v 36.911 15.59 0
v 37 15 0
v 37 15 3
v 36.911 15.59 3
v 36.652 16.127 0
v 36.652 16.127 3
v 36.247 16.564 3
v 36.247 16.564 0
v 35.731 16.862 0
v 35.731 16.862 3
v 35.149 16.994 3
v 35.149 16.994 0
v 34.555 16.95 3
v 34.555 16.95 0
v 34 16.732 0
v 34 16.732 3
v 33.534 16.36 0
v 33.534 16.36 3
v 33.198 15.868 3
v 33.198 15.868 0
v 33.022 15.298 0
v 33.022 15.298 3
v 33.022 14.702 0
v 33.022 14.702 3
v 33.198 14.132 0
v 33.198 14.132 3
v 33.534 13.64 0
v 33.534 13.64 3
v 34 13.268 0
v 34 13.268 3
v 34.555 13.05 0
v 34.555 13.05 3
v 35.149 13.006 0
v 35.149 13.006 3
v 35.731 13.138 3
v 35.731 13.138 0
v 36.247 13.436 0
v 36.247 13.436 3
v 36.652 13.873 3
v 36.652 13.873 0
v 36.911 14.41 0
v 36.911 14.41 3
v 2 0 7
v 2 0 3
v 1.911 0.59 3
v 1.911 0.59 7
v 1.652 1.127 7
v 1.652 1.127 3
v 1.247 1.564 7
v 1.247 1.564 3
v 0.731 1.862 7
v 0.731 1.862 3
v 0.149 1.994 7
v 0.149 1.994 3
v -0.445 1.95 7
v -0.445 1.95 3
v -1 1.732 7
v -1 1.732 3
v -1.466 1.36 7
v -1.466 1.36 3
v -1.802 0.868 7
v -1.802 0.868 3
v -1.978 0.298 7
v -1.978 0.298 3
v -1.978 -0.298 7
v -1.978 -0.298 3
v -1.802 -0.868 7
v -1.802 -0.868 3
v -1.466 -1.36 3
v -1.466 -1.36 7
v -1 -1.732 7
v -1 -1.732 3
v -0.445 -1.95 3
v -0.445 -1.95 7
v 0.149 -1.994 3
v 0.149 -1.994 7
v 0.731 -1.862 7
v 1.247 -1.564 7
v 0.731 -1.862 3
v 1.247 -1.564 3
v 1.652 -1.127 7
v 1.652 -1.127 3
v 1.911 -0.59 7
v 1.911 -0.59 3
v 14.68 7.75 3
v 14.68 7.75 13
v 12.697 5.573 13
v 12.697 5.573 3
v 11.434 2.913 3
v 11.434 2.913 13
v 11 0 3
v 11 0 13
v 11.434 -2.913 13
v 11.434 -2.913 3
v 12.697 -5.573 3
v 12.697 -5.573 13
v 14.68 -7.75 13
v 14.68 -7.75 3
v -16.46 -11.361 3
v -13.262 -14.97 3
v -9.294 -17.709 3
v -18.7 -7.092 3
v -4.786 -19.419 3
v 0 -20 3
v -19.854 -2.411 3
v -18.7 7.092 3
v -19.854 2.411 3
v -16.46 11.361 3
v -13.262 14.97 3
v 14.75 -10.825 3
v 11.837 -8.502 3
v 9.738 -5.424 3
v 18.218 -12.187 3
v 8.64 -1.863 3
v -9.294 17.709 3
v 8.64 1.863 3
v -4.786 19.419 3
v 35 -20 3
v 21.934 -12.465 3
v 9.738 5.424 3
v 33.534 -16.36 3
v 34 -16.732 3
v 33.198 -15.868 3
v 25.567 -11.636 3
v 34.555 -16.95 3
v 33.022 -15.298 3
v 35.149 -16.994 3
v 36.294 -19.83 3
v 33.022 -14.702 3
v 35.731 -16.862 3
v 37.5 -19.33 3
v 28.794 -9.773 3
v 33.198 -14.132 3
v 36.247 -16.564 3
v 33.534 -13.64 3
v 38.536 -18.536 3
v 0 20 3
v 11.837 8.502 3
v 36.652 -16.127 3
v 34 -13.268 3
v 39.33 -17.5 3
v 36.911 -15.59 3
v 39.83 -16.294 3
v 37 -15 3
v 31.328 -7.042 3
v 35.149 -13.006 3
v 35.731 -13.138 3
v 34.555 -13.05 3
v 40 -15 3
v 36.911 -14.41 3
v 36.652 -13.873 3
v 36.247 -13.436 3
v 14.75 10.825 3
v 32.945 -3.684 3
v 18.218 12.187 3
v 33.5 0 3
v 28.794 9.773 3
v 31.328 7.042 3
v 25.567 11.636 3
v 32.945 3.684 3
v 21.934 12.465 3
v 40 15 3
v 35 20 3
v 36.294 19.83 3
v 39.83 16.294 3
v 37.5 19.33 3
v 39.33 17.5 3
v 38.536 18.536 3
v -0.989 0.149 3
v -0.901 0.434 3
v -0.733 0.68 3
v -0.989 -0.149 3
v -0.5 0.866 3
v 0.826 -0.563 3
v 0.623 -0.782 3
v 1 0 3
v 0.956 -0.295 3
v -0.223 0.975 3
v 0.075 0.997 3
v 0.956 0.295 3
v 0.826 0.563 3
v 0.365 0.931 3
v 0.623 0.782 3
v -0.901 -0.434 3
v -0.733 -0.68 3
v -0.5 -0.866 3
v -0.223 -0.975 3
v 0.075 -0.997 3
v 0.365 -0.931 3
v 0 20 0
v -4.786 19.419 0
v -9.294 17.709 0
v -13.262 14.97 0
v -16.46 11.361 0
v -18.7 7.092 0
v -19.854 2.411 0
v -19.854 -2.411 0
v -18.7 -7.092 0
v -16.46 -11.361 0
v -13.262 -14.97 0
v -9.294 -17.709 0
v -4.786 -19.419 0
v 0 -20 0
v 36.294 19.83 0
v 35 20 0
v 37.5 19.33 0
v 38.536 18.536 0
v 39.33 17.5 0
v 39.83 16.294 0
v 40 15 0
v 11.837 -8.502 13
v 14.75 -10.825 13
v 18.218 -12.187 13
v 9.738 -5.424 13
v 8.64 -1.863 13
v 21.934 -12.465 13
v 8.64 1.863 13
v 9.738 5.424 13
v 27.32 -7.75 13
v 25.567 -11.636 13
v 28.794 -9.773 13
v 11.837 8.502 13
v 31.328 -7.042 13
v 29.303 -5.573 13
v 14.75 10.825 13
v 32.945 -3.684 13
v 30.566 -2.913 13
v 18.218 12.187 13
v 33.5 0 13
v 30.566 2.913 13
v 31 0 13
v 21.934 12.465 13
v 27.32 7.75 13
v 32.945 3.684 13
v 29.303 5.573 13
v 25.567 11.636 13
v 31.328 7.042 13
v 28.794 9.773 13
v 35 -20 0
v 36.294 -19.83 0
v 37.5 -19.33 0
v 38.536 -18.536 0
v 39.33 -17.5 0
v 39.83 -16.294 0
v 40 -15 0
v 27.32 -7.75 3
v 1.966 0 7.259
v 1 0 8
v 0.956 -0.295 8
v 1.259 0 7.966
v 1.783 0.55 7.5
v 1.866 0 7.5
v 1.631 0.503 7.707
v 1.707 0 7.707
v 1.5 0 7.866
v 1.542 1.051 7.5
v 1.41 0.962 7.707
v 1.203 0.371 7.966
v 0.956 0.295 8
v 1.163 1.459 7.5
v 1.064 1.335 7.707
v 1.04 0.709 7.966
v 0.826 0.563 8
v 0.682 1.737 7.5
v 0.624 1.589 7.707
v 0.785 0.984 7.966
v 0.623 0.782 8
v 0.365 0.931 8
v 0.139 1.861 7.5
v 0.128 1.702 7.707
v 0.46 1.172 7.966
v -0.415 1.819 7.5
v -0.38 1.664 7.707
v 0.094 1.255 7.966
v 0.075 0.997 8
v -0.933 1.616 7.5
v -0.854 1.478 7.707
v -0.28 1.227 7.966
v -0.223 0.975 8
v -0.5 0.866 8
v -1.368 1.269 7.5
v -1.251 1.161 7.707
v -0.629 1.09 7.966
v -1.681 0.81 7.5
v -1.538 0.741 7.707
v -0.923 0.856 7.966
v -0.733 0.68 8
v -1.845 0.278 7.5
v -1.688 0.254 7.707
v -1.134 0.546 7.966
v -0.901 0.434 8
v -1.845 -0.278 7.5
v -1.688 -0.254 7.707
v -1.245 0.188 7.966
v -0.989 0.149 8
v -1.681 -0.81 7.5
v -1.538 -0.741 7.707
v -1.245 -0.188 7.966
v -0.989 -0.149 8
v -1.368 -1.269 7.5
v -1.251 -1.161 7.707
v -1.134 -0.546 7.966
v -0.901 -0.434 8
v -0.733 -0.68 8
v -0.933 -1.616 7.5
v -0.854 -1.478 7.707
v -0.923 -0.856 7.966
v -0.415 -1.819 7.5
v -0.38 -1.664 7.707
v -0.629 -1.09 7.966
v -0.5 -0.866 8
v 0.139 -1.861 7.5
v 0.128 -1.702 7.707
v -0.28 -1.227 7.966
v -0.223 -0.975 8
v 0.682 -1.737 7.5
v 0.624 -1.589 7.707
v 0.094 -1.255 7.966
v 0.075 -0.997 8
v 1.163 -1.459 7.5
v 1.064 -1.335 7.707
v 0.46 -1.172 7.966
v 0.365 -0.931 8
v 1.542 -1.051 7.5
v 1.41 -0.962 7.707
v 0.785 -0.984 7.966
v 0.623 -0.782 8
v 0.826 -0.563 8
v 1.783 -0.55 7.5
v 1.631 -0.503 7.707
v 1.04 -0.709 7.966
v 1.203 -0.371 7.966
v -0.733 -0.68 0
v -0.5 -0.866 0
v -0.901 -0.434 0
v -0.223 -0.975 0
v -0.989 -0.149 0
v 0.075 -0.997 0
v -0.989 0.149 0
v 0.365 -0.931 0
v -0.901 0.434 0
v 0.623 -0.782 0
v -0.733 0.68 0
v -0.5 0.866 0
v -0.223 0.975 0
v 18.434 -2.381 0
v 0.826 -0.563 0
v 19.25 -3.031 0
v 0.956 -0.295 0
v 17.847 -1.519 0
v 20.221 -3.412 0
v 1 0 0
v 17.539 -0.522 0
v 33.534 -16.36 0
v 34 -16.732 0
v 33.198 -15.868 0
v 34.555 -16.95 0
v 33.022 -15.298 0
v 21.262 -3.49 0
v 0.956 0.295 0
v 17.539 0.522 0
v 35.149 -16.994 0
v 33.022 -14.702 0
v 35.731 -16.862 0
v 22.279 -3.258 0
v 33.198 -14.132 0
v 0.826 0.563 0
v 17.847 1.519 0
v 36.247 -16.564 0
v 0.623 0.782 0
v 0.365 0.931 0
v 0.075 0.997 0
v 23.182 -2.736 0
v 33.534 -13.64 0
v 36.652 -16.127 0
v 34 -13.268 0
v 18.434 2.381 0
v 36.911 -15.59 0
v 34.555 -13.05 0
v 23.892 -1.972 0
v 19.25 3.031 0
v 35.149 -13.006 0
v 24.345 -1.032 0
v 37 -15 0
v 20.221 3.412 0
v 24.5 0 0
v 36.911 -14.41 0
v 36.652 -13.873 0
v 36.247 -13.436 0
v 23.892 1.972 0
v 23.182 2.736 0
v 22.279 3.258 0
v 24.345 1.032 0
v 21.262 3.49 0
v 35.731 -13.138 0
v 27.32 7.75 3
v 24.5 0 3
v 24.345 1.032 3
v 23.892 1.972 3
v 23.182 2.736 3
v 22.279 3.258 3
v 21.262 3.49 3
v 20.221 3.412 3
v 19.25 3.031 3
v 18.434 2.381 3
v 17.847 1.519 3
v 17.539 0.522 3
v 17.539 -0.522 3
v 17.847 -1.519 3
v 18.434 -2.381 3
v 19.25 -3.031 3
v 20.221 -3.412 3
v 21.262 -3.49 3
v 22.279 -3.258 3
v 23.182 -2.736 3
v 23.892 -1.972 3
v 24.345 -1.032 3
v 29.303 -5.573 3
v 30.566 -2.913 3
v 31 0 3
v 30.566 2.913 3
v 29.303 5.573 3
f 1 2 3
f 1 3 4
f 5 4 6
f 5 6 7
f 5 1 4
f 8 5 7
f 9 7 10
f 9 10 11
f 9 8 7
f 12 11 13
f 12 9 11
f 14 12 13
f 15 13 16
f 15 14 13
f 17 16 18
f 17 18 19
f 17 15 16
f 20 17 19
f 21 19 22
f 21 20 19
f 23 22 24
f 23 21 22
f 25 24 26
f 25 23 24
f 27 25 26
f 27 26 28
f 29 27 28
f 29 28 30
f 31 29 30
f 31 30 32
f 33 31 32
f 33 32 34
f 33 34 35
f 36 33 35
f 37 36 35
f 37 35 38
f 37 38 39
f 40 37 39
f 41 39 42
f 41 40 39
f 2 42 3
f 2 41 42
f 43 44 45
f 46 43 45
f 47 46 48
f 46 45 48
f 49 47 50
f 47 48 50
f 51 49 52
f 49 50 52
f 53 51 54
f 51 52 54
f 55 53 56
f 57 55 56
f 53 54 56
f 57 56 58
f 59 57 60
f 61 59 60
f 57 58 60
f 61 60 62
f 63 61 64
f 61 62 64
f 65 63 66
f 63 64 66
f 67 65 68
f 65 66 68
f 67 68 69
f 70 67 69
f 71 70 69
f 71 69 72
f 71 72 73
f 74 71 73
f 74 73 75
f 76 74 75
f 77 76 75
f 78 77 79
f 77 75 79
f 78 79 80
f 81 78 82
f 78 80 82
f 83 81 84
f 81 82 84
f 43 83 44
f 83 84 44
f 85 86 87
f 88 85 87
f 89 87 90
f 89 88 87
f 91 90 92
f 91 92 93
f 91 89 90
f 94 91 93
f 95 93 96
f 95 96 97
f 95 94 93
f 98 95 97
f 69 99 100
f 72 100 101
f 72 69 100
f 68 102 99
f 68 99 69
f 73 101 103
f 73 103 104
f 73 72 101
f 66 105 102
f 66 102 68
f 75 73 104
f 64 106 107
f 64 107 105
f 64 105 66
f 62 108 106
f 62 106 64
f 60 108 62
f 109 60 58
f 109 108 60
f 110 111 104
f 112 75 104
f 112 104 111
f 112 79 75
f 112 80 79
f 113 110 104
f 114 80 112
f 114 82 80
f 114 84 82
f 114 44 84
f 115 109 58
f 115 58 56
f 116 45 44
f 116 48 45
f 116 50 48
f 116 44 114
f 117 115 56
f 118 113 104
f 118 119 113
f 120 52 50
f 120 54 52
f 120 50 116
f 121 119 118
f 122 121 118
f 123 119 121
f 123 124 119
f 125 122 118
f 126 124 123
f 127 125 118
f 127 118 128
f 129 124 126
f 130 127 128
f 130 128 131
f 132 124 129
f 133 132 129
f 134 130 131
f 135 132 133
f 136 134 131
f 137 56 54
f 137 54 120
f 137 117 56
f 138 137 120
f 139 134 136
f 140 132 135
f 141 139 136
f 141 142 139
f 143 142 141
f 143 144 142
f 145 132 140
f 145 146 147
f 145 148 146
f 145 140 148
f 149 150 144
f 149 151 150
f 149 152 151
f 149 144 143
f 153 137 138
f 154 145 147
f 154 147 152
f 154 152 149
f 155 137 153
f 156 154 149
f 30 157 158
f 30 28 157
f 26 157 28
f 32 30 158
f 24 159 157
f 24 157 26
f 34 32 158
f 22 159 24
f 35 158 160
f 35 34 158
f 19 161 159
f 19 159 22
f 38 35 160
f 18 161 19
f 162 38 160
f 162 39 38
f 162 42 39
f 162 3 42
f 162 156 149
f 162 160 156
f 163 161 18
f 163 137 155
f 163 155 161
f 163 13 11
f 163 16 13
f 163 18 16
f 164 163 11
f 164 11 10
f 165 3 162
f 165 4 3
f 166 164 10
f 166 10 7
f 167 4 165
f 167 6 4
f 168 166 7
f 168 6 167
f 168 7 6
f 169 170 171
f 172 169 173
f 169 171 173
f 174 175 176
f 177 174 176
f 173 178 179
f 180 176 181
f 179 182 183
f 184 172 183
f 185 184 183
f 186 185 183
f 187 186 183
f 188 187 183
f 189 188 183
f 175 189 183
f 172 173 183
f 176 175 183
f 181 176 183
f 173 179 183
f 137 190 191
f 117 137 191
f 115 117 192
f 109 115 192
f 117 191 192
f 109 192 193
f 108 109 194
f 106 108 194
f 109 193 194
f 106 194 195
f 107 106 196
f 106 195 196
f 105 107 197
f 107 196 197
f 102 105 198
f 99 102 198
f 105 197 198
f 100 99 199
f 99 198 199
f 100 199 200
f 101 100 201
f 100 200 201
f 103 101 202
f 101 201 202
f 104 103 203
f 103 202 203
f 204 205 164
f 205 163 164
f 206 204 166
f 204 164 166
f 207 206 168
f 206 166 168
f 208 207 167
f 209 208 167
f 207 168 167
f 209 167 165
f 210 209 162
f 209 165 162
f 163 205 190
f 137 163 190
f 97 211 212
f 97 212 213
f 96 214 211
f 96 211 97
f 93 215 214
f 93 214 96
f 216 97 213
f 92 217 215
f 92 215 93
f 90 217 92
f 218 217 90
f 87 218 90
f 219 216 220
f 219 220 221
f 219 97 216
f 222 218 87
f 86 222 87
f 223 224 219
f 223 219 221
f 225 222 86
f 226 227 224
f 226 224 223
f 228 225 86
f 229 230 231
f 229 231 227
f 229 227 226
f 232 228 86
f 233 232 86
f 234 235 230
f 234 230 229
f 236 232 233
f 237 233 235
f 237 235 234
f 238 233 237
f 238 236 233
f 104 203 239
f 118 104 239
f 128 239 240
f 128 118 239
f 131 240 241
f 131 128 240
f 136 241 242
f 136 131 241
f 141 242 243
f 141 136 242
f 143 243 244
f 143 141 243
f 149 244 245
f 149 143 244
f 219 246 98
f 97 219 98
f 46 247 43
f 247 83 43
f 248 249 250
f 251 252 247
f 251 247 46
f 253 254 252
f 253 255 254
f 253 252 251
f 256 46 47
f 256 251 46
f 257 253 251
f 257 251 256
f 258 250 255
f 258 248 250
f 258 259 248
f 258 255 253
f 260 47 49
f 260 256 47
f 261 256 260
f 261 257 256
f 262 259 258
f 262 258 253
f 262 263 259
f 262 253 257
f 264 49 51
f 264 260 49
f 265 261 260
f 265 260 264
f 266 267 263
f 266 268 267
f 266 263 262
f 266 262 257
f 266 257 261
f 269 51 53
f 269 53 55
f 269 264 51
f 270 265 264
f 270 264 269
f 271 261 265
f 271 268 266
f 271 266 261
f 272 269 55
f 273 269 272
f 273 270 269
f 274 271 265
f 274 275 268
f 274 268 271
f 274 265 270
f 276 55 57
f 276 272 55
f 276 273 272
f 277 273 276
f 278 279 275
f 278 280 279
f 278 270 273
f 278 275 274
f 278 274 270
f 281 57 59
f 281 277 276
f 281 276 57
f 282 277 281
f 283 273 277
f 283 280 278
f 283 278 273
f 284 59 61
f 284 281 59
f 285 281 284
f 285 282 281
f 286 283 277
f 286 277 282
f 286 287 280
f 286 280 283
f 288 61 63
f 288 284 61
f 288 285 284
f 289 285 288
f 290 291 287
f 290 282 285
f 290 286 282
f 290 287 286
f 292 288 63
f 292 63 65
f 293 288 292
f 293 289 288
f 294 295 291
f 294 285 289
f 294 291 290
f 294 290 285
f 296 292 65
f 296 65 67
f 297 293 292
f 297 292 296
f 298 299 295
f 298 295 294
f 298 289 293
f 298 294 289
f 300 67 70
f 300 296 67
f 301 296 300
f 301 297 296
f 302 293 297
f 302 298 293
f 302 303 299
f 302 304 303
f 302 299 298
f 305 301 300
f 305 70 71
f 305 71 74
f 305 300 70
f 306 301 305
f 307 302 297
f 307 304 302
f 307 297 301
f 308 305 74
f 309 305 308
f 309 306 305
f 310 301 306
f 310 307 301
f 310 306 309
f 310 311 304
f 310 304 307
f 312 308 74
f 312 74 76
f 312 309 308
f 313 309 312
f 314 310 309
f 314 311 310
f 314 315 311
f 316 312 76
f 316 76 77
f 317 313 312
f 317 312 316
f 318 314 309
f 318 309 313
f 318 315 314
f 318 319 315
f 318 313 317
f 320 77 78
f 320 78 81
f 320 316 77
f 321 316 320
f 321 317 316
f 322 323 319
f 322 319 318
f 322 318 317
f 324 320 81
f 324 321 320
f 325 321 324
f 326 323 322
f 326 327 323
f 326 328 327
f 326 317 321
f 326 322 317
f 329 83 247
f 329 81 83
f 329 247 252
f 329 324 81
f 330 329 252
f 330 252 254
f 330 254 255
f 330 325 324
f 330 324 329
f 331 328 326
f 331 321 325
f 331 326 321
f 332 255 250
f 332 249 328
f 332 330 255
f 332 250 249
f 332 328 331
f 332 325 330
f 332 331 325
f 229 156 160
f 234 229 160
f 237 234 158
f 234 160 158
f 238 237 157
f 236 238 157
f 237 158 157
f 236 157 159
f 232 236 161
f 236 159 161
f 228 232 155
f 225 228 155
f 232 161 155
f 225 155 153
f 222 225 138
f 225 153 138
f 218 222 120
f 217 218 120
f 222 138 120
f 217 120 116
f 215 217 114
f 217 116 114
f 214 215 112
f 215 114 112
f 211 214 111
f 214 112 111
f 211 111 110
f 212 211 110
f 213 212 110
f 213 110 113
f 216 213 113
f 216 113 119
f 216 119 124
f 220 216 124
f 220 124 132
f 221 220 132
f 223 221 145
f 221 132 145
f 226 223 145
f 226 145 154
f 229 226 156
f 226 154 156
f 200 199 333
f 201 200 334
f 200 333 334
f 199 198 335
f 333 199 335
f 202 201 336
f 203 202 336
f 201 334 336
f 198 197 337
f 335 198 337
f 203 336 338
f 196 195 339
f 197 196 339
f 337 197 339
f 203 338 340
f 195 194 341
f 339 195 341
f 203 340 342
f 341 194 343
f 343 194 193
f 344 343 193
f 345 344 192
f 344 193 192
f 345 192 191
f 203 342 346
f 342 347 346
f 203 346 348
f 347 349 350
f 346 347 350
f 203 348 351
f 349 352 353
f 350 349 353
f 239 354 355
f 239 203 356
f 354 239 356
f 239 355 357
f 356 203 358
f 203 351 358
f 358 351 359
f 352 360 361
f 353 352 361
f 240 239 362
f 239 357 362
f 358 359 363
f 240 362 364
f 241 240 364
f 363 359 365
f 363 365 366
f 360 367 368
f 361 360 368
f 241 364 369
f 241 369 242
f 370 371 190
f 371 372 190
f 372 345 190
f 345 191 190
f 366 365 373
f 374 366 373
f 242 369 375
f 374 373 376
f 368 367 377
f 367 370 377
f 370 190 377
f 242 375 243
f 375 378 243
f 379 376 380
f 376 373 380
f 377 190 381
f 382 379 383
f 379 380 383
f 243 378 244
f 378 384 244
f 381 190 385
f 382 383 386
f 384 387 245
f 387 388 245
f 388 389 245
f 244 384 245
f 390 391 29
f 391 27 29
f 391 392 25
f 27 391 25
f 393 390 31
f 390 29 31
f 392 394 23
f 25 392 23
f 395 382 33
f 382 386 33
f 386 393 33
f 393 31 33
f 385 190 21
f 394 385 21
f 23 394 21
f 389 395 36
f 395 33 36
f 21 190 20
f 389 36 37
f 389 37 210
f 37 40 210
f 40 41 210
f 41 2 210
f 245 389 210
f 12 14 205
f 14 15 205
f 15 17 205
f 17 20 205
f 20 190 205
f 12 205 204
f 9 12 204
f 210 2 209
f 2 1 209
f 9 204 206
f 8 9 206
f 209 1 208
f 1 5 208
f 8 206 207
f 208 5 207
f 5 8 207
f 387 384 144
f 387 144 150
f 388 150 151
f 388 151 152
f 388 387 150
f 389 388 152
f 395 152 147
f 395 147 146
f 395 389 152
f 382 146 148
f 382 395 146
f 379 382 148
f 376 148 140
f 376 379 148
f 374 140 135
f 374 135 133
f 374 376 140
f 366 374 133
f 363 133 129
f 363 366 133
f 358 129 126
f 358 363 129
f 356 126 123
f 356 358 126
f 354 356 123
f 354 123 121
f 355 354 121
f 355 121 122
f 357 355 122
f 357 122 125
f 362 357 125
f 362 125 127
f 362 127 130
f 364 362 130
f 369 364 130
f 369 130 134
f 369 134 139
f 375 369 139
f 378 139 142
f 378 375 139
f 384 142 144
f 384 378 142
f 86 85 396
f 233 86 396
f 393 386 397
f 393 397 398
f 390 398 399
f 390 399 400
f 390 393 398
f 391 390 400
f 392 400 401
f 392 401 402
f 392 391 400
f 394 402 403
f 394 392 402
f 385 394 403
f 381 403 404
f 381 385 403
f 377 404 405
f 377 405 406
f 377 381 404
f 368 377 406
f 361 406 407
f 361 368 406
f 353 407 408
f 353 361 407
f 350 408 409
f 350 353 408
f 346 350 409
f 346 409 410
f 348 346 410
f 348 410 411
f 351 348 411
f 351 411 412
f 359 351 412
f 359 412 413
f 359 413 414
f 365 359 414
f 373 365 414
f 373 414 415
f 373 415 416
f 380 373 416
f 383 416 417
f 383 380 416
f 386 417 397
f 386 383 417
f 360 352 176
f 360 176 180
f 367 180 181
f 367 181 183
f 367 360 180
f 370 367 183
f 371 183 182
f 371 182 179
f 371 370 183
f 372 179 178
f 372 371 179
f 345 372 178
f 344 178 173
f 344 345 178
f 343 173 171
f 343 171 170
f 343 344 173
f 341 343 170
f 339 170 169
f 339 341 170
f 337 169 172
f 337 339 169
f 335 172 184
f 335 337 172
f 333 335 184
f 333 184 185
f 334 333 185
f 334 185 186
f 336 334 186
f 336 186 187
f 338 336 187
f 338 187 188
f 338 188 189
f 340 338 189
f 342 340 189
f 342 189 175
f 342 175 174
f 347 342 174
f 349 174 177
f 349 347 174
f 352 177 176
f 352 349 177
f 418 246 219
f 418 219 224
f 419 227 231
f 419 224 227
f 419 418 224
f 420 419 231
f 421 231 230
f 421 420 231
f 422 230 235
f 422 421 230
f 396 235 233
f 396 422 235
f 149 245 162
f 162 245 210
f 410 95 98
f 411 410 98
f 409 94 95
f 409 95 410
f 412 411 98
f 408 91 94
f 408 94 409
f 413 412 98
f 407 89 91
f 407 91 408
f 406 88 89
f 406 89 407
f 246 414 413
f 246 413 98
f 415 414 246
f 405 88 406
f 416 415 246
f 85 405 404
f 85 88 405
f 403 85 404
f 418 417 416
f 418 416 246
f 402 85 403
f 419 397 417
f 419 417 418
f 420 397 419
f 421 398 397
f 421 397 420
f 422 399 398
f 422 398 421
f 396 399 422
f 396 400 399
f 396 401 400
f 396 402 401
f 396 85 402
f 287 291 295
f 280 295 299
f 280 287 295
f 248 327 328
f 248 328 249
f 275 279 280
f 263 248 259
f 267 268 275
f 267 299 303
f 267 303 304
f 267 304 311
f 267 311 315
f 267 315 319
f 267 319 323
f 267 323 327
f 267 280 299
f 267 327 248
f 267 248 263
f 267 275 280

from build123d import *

# Parameters (mm, degrees)
SKIZZE1_R                       = 3.5
SKIZZE1_R_2                     = 1
SKIZZE1_R_3                     = 2
AUFSATZ_LINEAR_AUSTRAGEN1_DEPTH = 3
VERRUNDUNG1_R                   = 5
SKIZZE2_R                       = 12.5
SKIZZE2_R_2                     = 10
AUFSATZ_LINEAR_AUSTRAGEN2_DEPTH = 10
SKIZZE3_R                       = 2
AUFSATZ_LINEAR_AUSTRAGEN3_DEPTH = 5
VERRUNDUNG2_R                   = 1


with BuildPart() as part:
    # Skizze1 → Aufsatz-Linear austragen1 (new body)
    with BuildSketch(Plane.XY):
        with BuildLine():
            ThreePointArc((0, 20), (-20, 0), (0, -20))
            Line((0, -20), (40, -20))
            Line((40, -20), (40, 20))
            Line((40, 20), (0, 20))
        make_face()
        with Locations((21, 0)):
            Circle(SKIZZE1_R, mode=Mode.SUBTRACT)
        Circle(SKIZZE1_R_2, mode=Mode.SUBTRACT)
        with Locations((35, 15)):
            Circle(SKIZZE1_R_3, mode=Mode.SUBTRACT)
        with Locations((35, -15)):
            Circle(SKIZZE1_R_3, mode=Mode.SUBTRACT)
    extrude(amount=AUFSATZ_LINEAR_AUSTRAGEN1_DEPTH)

    # Verrundung1
    verrundung1_edges = [part.edges().sort_by_distance(p)[0] for p in [
        (40, 20, 1.5),
        (40, -20, 1.5),
    ]]
    fillet(verrundung1_edges, radius=VERRUNDUNG1_R)

    # Skizze2 → Aufsatz-Linear austragen2 (add)
    # profile 1 of 3: a face of its own
    with BuildSketch(Plane.XY.offset(3)):
        with Locations((21, 0)):
            Circle(SKIZZE2_R)
        with Locations((21, 0)):
            Circle(SKIZZE2_R_2, mode=Mode.SUBTRACT)
    # profile 2 of 3: a face of its own
    with BuildSketch(Plane.XY.offset(3)):
        with BuildLine():
            Line((21, -7.75), (14.68038767, -7.75))
            ThreePointArc((14.68038767, -7.75), (21, -10), (27.31961233, -7.75))
            Line((27.31961233, -7.75), (21, -7.75))
        make_face()
    # profile 3 of 3: a face of its own
    with BuildSketch(Plane.XY.offset(3)):
        with BuildLine():
            ThreePointArc((27.31961233, 7.75), (21, 10), (14.68038767, 7.75))
            Line((14.68038767, 7.75), (21, 7.75))
            Line((21, 7.75), (27.31961233, 7.75))
        make_face()
    extrude(amount=AUFSATZ_LINEAR_AUSTRAGEN2_DEPTH)

    # Skizze3 → Aufsatz-Linear austragen3 (add)
    with BuildSketch(Plane.XY.offset(3)):
        Circle(SKIZZE3_R)
    extrude(amount=AUFSATZ_LINEAR_AUSTRAGEN3_DEPTH)

    # Verrundung2
    verrundung2_edges = [part.edges().sort_by_distance(p)[0] for p in [
        (-2, 0, 8),
    ]]
    fillet(verrundung2_edges, radius=VERRUNDUNG2_R)


solid = part.part
